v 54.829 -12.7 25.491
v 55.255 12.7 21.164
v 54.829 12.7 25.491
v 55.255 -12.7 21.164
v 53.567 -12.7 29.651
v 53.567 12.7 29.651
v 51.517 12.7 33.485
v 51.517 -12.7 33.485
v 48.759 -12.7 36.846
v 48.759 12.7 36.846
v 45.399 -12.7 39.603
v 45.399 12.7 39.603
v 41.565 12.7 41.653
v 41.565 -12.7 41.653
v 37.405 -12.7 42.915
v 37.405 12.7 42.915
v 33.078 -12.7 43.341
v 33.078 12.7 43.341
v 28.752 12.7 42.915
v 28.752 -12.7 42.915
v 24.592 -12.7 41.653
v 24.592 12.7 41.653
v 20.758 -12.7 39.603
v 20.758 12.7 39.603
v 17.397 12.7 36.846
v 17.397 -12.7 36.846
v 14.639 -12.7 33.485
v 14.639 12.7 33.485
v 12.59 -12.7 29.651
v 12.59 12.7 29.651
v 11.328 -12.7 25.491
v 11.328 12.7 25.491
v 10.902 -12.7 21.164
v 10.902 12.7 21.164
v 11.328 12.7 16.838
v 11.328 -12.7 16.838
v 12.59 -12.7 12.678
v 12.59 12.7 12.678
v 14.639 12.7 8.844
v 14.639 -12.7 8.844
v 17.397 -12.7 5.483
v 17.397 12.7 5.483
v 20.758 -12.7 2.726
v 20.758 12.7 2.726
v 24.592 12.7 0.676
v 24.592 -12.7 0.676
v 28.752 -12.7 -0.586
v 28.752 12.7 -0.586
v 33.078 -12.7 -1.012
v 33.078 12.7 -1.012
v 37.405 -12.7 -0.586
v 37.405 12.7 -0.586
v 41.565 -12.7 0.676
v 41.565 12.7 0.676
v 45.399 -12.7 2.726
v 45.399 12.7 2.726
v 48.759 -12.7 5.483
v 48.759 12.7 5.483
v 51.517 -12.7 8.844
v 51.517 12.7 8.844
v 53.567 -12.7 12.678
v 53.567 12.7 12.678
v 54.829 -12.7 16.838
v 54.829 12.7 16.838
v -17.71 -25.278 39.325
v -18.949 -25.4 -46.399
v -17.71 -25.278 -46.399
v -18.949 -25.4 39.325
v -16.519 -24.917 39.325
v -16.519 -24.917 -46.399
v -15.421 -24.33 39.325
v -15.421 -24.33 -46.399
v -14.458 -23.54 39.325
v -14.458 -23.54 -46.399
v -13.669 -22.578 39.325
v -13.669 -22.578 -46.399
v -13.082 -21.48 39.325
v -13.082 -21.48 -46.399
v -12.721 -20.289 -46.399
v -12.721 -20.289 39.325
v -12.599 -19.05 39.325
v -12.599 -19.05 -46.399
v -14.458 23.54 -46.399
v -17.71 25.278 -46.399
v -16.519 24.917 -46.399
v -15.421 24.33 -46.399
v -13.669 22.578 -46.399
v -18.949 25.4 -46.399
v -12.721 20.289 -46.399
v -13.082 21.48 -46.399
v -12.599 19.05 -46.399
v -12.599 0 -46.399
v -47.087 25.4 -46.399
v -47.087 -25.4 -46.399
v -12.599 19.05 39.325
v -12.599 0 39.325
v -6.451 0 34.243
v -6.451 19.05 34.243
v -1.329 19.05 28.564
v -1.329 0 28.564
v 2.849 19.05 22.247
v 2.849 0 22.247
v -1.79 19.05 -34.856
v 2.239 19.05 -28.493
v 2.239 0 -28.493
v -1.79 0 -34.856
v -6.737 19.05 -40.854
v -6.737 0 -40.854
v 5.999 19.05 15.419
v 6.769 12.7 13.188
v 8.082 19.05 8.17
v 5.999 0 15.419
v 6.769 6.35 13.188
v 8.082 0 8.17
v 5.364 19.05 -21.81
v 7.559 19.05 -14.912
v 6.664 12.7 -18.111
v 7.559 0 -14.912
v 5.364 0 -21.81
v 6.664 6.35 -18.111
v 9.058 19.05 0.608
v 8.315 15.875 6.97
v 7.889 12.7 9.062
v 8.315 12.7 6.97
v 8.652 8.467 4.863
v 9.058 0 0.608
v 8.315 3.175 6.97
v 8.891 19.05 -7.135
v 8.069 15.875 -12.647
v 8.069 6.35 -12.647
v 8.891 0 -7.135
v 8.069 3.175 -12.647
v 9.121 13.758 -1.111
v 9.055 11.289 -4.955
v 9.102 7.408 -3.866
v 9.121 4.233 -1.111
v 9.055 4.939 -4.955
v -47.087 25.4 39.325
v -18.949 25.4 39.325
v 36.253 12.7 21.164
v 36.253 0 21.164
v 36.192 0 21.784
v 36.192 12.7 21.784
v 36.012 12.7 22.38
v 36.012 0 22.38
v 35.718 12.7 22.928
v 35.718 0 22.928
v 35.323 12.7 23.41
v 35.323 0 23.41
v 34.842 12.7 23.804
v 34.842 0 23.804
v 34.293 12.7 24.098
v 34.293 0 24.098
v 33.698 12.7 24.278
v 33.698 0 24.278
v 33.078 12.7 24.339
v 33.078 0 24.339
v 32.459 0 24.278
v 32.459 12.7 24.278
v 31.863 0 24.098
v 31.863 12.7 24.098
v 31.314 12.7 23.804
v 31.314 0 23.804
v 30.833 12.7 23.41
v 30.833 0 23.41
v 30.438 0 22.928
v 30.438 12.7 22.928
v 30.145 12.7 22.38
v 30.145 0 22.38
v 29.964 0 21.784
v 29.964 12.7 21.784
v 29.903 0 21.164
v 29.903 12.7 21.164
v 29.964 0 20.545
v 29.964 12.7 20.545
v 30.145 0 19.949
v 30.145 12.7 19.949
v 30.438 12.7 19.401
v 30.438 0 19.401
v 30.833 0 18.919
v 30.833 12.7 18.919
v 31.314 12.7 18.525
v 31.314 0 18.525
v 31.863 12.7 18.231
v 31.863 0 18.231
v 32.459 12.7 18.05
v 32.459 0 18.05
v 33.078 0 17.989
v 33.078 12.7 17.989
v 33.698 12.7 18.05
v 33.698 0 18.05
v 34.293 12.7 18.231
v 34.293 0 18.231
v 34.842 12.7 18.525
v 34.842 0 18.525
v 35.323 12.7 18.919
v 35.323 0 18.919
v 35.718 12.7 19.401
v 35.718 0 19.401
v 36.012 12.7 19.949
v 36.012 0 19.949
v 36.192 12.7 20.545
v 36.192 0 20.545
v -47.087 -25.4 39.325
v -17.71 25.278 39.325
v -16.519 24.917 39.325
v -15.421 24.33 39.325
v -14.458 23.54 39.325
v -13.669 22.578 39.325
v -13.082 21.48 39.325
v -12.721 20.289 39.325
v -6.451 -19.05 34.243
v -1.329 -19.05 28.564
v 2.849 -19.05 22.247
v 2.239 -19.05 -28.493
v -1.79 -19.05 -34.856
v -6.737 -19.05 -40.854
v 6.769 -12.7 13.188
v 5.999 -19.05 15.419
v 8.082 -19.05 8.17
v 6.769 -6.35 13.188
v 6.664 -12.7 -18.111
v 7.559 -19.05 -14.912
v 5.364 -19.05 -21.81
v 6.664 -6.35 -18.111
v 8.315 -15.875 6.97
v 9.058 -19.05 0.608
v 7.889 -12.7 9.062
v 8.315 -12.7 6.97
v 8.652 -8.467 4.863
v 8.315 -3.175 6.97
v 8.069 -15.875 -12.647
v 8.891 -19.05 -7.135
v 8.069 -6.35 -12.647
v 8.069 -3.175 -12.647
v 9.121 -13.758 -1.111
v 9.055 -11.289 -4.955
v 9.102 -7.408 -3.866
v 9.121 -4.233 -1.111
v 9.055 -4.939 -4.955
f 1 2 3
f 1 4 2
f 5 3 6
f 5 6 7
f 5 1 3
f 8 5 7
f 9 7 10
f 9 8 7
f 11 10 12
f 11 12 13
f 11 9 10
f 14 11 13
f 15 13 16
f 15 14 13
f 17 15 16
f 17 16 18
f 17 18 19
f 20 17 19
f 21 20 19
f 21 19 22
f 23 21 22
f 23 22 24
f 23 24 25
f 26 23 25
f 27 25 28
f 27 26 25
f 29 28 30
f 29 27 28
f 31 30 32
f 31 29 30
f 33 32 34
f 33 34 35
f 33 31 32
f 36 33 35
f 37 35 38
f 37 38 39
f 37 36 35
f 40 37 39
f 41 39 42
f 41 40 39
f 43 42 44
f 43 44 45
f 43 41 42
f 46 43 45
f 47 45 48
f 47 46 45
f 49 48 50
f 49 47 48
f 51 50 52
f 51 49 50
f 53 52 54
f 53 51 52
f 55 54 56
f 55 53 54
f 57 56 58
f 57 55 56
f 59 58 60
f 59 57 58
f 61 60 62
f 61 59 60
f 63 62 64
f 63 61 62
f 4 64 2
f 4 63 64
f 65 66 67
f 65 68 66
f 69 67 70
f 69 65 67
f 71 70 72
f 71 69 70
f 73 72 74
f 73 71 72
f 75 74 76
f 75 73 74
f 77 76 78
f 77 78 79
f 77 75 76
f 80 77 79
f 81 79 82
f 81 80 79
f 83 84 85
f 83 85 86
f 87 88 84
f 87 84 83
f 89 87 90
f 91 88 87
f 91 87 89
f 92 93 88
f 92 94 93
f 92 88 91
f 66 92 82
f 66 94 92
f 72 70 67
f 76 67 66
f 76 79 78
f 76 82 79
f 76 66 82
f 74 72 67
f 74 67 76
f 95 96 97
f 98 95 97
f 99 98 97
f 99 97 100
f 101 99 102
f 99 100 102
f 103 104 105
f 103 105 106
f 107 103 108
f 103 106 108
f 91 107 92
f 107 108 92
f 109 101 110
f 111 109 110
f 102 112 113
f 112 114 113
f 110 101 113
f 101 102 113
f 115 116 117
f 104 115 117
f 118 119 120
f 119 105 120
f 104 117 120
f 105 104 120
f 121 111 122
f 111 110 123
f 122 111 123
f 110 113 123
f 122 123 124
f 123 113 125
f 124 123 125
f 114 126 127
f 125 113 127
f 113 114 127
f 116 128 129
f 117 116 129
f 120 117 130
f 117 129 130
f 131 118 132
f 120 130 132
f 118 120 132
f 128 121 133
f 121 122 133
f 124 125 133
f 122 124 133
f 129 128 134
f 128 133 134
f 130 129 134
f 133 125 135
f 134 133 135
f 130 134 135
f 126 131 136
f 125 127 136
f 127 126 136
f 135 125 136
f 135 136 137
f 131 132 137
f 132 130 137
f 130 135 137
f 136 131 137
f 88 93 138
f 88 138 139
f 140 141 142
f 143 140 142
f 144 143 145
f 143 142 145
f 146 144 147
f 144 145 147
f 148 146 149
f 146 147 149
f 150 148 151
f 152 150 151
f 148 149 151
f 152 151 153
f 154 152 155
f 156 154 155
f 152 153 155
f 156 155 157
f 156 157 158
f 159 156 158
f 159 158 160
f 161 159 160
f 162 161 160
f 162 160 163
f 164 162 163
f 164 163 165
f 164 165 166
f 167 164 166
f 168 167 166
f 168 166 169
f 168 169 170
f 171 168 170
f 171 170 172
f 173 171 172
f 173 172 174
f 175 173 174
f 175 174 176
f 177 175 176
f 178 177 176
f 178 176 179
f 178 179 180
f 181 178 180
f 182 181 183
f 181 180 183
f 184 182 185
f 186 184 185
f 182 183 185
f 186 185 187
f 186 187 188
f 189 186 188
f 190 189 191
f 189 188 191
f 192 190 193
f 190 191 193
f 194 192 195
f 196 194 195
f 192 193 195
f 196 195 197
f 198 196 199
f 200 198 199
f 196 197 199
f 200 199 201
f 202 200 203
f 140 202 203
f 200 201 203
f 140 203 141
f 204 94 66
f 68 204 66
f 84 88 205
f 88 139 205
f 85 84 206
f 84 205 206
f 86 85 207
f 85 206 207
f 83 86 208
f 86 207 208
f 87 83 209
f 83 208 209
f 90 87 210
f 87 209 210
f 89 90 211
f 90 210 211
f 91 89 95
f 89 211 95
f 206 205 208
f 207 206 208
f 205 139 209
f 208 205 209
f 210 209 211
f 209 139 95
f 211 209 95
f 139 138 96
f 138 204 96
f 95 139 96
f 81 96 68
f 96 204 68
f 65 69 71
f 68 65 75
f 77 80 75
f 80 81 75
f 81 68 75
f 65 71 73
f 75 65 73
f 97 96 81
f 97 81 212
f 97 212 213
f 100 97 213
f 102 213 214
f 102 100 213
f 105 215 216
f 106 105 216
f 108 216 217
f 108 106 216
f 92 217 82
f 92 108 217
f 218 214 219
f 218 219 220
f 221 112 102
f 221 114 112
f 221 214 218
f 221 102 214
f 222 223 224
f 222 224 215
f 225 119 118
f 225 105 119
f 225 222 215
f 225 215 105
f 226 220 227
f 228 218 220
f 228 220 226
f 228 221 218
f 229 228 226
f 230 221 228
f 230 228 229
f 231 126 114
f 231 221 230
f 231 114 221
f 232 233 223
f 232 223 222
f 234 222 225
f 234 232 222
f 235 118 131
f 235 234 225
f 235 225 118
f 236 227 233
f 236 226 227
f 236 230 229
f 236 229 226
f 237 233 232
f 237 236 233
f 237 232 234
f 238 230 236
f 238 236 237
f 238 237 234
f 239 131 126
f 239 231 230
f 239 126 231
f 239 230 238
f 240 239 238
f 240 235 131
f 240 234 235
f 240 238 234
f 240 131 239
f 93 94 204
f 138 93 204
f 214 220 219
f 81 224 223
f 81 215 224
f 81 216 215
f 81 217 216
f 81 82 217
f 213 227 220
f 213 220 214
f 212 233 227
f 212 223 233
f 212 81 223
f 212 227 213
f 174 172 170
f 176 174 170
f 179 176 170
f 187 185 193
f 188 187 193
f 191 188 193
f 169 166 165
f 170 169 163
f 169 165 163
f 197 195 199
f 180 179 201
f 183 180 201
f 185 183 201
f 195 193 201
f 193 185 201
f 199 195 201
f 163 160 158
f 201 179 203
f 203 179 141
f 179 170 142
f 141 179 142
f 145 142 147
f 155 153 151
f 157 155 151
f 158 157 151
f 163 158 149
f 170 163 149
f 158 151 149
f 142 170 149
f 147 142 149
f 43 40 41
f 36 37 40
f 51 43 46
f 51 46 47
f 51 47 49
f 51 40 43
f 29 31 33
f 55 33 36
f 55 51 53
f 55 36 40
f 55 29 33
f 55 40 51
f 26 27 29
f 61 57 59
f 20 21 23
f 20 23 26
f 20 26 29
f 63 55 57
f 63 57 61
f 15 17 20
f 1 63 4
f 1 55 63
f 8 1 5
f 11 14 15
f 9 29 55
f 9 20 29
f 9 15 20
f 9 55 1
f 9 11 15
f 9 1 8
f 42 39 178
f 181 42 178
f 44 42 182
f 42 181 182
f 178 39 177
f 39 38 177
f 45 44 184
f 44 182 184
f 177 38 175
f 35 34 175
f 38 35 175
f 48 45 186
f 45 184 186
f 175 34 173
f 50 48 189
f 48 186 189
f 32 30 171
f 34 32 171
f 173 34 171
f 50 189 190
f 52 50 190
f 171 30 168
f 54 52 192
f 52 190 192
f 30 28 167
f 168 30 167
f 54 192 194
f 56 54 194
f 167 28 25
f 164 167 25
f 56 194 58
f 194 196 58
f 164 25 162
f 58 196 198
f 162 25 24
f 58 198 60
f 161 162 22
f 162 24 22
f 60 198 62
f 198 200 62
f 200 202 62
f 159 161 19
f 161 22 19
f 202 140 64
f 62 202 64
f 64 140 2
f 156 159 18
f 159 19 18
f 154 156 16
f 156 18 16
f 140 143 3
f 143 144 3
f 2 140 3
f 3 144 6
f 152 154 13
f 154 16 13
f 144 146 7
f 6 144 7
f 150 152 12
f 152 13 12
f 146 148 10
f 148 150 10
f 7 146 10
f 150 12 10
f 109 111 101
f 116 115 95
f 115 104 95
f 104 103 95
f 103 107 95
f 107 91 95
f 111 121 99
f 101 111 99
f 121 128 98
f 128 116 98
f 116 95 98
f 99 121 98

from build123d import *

# Parameters (mm, degrees)
F0_W     = 34.4880186021
F0_H     = 85.7237949967
F1_DEPTH = 25.4
F2_DEPTH = 19.05
F3_R     = 6.34999
F0_R     = 22.1763652159
F0_R_2   = 9.4763652159
F4_DEPTH = 12.7
F5_DEPTH = 12.7
F6_D     = 6.35
F6_DEPTH = 25.401


# Not quite as in the source:
# - a fillet or chamfer is up to 0.001 mm smaller than in the source, because OpenCascade refuses the exact size


with BuildPart() as f1:
    # F0 (on Front) → F1 (new body, symmetric)
    with BuildSketch(Plane.XZ):
        with Locations((-29.842576012, -3.5368986428)):
            Rectangle(F0_W, F0_H)
    extrude(amount=F1_DEPTH, both=True)

    # F0 (on Front) → F2 (join, symmetric)
    with BuildSketch(Plane.XZ):
        with BuildLine():
            Line((-12.5985667109, 39.3249988556), (-12.5985667109, -46.3987961411))
            add(Edge.make_bspline(
                [(-12.5985667109, 39.3249988556), (16.6084952652, 18.4920281172), (16.1393098533, -22.3401486874), (-12.5985667109, -46.3987961411)],
                knots=[0, 0, 0, 0, 85.7237949967, 85.7237949967, 85.7237949967, 85.7237949967], degree=3))
        make_face()
    extrude(amount=F2_DEPTH, both=True)

    # F3 (radius 6.35 in the source; OpenCascade refuses exactly that, so slightly less here)
    f3_edges = [f1.edges().sort_by_distance(p)[0] for p in [
        (-12.598567, -25.4, -3.536899),
        (-12.598567, 25.4, -3.536899),
    ]]
    fillet(f3_edges, radius=F3_R)


with BuildPart() as f4:
    # F0 (on Front) → F4 (new body, symmetric)
    with BuildSketch(Plane.XZ):
        with Locations((33.0783426762, 21.1644805968)):
            Circle(F0_R)
        with Locations((33.0783426762, 21.1644805968)):
            Circle(F0_R_2, mode=Mode.SUBTRACT)
    extrude(amount=F4_DEPTH, both=True)

    # F0 (on Front) → F5 (join, symmetric)
    with BuildSketch(Plane.XZ):
        with Locations((33.0783426762, 21.1644805968)):
            Circle(F0_R_2)
    extrude(amount=F5_DEPTH, both=True)

    # F6 (through all, one way)
    with BuildSketch(Plane.XZ):
        with Locations((33.0783426762, 21.1644805968)):
            Circle(F6_D / 2)
    extrude(amount=-F6_DEPTH, mode=Mode.SUBTRACT)


solid = Compound([f1.part, f4.part])
